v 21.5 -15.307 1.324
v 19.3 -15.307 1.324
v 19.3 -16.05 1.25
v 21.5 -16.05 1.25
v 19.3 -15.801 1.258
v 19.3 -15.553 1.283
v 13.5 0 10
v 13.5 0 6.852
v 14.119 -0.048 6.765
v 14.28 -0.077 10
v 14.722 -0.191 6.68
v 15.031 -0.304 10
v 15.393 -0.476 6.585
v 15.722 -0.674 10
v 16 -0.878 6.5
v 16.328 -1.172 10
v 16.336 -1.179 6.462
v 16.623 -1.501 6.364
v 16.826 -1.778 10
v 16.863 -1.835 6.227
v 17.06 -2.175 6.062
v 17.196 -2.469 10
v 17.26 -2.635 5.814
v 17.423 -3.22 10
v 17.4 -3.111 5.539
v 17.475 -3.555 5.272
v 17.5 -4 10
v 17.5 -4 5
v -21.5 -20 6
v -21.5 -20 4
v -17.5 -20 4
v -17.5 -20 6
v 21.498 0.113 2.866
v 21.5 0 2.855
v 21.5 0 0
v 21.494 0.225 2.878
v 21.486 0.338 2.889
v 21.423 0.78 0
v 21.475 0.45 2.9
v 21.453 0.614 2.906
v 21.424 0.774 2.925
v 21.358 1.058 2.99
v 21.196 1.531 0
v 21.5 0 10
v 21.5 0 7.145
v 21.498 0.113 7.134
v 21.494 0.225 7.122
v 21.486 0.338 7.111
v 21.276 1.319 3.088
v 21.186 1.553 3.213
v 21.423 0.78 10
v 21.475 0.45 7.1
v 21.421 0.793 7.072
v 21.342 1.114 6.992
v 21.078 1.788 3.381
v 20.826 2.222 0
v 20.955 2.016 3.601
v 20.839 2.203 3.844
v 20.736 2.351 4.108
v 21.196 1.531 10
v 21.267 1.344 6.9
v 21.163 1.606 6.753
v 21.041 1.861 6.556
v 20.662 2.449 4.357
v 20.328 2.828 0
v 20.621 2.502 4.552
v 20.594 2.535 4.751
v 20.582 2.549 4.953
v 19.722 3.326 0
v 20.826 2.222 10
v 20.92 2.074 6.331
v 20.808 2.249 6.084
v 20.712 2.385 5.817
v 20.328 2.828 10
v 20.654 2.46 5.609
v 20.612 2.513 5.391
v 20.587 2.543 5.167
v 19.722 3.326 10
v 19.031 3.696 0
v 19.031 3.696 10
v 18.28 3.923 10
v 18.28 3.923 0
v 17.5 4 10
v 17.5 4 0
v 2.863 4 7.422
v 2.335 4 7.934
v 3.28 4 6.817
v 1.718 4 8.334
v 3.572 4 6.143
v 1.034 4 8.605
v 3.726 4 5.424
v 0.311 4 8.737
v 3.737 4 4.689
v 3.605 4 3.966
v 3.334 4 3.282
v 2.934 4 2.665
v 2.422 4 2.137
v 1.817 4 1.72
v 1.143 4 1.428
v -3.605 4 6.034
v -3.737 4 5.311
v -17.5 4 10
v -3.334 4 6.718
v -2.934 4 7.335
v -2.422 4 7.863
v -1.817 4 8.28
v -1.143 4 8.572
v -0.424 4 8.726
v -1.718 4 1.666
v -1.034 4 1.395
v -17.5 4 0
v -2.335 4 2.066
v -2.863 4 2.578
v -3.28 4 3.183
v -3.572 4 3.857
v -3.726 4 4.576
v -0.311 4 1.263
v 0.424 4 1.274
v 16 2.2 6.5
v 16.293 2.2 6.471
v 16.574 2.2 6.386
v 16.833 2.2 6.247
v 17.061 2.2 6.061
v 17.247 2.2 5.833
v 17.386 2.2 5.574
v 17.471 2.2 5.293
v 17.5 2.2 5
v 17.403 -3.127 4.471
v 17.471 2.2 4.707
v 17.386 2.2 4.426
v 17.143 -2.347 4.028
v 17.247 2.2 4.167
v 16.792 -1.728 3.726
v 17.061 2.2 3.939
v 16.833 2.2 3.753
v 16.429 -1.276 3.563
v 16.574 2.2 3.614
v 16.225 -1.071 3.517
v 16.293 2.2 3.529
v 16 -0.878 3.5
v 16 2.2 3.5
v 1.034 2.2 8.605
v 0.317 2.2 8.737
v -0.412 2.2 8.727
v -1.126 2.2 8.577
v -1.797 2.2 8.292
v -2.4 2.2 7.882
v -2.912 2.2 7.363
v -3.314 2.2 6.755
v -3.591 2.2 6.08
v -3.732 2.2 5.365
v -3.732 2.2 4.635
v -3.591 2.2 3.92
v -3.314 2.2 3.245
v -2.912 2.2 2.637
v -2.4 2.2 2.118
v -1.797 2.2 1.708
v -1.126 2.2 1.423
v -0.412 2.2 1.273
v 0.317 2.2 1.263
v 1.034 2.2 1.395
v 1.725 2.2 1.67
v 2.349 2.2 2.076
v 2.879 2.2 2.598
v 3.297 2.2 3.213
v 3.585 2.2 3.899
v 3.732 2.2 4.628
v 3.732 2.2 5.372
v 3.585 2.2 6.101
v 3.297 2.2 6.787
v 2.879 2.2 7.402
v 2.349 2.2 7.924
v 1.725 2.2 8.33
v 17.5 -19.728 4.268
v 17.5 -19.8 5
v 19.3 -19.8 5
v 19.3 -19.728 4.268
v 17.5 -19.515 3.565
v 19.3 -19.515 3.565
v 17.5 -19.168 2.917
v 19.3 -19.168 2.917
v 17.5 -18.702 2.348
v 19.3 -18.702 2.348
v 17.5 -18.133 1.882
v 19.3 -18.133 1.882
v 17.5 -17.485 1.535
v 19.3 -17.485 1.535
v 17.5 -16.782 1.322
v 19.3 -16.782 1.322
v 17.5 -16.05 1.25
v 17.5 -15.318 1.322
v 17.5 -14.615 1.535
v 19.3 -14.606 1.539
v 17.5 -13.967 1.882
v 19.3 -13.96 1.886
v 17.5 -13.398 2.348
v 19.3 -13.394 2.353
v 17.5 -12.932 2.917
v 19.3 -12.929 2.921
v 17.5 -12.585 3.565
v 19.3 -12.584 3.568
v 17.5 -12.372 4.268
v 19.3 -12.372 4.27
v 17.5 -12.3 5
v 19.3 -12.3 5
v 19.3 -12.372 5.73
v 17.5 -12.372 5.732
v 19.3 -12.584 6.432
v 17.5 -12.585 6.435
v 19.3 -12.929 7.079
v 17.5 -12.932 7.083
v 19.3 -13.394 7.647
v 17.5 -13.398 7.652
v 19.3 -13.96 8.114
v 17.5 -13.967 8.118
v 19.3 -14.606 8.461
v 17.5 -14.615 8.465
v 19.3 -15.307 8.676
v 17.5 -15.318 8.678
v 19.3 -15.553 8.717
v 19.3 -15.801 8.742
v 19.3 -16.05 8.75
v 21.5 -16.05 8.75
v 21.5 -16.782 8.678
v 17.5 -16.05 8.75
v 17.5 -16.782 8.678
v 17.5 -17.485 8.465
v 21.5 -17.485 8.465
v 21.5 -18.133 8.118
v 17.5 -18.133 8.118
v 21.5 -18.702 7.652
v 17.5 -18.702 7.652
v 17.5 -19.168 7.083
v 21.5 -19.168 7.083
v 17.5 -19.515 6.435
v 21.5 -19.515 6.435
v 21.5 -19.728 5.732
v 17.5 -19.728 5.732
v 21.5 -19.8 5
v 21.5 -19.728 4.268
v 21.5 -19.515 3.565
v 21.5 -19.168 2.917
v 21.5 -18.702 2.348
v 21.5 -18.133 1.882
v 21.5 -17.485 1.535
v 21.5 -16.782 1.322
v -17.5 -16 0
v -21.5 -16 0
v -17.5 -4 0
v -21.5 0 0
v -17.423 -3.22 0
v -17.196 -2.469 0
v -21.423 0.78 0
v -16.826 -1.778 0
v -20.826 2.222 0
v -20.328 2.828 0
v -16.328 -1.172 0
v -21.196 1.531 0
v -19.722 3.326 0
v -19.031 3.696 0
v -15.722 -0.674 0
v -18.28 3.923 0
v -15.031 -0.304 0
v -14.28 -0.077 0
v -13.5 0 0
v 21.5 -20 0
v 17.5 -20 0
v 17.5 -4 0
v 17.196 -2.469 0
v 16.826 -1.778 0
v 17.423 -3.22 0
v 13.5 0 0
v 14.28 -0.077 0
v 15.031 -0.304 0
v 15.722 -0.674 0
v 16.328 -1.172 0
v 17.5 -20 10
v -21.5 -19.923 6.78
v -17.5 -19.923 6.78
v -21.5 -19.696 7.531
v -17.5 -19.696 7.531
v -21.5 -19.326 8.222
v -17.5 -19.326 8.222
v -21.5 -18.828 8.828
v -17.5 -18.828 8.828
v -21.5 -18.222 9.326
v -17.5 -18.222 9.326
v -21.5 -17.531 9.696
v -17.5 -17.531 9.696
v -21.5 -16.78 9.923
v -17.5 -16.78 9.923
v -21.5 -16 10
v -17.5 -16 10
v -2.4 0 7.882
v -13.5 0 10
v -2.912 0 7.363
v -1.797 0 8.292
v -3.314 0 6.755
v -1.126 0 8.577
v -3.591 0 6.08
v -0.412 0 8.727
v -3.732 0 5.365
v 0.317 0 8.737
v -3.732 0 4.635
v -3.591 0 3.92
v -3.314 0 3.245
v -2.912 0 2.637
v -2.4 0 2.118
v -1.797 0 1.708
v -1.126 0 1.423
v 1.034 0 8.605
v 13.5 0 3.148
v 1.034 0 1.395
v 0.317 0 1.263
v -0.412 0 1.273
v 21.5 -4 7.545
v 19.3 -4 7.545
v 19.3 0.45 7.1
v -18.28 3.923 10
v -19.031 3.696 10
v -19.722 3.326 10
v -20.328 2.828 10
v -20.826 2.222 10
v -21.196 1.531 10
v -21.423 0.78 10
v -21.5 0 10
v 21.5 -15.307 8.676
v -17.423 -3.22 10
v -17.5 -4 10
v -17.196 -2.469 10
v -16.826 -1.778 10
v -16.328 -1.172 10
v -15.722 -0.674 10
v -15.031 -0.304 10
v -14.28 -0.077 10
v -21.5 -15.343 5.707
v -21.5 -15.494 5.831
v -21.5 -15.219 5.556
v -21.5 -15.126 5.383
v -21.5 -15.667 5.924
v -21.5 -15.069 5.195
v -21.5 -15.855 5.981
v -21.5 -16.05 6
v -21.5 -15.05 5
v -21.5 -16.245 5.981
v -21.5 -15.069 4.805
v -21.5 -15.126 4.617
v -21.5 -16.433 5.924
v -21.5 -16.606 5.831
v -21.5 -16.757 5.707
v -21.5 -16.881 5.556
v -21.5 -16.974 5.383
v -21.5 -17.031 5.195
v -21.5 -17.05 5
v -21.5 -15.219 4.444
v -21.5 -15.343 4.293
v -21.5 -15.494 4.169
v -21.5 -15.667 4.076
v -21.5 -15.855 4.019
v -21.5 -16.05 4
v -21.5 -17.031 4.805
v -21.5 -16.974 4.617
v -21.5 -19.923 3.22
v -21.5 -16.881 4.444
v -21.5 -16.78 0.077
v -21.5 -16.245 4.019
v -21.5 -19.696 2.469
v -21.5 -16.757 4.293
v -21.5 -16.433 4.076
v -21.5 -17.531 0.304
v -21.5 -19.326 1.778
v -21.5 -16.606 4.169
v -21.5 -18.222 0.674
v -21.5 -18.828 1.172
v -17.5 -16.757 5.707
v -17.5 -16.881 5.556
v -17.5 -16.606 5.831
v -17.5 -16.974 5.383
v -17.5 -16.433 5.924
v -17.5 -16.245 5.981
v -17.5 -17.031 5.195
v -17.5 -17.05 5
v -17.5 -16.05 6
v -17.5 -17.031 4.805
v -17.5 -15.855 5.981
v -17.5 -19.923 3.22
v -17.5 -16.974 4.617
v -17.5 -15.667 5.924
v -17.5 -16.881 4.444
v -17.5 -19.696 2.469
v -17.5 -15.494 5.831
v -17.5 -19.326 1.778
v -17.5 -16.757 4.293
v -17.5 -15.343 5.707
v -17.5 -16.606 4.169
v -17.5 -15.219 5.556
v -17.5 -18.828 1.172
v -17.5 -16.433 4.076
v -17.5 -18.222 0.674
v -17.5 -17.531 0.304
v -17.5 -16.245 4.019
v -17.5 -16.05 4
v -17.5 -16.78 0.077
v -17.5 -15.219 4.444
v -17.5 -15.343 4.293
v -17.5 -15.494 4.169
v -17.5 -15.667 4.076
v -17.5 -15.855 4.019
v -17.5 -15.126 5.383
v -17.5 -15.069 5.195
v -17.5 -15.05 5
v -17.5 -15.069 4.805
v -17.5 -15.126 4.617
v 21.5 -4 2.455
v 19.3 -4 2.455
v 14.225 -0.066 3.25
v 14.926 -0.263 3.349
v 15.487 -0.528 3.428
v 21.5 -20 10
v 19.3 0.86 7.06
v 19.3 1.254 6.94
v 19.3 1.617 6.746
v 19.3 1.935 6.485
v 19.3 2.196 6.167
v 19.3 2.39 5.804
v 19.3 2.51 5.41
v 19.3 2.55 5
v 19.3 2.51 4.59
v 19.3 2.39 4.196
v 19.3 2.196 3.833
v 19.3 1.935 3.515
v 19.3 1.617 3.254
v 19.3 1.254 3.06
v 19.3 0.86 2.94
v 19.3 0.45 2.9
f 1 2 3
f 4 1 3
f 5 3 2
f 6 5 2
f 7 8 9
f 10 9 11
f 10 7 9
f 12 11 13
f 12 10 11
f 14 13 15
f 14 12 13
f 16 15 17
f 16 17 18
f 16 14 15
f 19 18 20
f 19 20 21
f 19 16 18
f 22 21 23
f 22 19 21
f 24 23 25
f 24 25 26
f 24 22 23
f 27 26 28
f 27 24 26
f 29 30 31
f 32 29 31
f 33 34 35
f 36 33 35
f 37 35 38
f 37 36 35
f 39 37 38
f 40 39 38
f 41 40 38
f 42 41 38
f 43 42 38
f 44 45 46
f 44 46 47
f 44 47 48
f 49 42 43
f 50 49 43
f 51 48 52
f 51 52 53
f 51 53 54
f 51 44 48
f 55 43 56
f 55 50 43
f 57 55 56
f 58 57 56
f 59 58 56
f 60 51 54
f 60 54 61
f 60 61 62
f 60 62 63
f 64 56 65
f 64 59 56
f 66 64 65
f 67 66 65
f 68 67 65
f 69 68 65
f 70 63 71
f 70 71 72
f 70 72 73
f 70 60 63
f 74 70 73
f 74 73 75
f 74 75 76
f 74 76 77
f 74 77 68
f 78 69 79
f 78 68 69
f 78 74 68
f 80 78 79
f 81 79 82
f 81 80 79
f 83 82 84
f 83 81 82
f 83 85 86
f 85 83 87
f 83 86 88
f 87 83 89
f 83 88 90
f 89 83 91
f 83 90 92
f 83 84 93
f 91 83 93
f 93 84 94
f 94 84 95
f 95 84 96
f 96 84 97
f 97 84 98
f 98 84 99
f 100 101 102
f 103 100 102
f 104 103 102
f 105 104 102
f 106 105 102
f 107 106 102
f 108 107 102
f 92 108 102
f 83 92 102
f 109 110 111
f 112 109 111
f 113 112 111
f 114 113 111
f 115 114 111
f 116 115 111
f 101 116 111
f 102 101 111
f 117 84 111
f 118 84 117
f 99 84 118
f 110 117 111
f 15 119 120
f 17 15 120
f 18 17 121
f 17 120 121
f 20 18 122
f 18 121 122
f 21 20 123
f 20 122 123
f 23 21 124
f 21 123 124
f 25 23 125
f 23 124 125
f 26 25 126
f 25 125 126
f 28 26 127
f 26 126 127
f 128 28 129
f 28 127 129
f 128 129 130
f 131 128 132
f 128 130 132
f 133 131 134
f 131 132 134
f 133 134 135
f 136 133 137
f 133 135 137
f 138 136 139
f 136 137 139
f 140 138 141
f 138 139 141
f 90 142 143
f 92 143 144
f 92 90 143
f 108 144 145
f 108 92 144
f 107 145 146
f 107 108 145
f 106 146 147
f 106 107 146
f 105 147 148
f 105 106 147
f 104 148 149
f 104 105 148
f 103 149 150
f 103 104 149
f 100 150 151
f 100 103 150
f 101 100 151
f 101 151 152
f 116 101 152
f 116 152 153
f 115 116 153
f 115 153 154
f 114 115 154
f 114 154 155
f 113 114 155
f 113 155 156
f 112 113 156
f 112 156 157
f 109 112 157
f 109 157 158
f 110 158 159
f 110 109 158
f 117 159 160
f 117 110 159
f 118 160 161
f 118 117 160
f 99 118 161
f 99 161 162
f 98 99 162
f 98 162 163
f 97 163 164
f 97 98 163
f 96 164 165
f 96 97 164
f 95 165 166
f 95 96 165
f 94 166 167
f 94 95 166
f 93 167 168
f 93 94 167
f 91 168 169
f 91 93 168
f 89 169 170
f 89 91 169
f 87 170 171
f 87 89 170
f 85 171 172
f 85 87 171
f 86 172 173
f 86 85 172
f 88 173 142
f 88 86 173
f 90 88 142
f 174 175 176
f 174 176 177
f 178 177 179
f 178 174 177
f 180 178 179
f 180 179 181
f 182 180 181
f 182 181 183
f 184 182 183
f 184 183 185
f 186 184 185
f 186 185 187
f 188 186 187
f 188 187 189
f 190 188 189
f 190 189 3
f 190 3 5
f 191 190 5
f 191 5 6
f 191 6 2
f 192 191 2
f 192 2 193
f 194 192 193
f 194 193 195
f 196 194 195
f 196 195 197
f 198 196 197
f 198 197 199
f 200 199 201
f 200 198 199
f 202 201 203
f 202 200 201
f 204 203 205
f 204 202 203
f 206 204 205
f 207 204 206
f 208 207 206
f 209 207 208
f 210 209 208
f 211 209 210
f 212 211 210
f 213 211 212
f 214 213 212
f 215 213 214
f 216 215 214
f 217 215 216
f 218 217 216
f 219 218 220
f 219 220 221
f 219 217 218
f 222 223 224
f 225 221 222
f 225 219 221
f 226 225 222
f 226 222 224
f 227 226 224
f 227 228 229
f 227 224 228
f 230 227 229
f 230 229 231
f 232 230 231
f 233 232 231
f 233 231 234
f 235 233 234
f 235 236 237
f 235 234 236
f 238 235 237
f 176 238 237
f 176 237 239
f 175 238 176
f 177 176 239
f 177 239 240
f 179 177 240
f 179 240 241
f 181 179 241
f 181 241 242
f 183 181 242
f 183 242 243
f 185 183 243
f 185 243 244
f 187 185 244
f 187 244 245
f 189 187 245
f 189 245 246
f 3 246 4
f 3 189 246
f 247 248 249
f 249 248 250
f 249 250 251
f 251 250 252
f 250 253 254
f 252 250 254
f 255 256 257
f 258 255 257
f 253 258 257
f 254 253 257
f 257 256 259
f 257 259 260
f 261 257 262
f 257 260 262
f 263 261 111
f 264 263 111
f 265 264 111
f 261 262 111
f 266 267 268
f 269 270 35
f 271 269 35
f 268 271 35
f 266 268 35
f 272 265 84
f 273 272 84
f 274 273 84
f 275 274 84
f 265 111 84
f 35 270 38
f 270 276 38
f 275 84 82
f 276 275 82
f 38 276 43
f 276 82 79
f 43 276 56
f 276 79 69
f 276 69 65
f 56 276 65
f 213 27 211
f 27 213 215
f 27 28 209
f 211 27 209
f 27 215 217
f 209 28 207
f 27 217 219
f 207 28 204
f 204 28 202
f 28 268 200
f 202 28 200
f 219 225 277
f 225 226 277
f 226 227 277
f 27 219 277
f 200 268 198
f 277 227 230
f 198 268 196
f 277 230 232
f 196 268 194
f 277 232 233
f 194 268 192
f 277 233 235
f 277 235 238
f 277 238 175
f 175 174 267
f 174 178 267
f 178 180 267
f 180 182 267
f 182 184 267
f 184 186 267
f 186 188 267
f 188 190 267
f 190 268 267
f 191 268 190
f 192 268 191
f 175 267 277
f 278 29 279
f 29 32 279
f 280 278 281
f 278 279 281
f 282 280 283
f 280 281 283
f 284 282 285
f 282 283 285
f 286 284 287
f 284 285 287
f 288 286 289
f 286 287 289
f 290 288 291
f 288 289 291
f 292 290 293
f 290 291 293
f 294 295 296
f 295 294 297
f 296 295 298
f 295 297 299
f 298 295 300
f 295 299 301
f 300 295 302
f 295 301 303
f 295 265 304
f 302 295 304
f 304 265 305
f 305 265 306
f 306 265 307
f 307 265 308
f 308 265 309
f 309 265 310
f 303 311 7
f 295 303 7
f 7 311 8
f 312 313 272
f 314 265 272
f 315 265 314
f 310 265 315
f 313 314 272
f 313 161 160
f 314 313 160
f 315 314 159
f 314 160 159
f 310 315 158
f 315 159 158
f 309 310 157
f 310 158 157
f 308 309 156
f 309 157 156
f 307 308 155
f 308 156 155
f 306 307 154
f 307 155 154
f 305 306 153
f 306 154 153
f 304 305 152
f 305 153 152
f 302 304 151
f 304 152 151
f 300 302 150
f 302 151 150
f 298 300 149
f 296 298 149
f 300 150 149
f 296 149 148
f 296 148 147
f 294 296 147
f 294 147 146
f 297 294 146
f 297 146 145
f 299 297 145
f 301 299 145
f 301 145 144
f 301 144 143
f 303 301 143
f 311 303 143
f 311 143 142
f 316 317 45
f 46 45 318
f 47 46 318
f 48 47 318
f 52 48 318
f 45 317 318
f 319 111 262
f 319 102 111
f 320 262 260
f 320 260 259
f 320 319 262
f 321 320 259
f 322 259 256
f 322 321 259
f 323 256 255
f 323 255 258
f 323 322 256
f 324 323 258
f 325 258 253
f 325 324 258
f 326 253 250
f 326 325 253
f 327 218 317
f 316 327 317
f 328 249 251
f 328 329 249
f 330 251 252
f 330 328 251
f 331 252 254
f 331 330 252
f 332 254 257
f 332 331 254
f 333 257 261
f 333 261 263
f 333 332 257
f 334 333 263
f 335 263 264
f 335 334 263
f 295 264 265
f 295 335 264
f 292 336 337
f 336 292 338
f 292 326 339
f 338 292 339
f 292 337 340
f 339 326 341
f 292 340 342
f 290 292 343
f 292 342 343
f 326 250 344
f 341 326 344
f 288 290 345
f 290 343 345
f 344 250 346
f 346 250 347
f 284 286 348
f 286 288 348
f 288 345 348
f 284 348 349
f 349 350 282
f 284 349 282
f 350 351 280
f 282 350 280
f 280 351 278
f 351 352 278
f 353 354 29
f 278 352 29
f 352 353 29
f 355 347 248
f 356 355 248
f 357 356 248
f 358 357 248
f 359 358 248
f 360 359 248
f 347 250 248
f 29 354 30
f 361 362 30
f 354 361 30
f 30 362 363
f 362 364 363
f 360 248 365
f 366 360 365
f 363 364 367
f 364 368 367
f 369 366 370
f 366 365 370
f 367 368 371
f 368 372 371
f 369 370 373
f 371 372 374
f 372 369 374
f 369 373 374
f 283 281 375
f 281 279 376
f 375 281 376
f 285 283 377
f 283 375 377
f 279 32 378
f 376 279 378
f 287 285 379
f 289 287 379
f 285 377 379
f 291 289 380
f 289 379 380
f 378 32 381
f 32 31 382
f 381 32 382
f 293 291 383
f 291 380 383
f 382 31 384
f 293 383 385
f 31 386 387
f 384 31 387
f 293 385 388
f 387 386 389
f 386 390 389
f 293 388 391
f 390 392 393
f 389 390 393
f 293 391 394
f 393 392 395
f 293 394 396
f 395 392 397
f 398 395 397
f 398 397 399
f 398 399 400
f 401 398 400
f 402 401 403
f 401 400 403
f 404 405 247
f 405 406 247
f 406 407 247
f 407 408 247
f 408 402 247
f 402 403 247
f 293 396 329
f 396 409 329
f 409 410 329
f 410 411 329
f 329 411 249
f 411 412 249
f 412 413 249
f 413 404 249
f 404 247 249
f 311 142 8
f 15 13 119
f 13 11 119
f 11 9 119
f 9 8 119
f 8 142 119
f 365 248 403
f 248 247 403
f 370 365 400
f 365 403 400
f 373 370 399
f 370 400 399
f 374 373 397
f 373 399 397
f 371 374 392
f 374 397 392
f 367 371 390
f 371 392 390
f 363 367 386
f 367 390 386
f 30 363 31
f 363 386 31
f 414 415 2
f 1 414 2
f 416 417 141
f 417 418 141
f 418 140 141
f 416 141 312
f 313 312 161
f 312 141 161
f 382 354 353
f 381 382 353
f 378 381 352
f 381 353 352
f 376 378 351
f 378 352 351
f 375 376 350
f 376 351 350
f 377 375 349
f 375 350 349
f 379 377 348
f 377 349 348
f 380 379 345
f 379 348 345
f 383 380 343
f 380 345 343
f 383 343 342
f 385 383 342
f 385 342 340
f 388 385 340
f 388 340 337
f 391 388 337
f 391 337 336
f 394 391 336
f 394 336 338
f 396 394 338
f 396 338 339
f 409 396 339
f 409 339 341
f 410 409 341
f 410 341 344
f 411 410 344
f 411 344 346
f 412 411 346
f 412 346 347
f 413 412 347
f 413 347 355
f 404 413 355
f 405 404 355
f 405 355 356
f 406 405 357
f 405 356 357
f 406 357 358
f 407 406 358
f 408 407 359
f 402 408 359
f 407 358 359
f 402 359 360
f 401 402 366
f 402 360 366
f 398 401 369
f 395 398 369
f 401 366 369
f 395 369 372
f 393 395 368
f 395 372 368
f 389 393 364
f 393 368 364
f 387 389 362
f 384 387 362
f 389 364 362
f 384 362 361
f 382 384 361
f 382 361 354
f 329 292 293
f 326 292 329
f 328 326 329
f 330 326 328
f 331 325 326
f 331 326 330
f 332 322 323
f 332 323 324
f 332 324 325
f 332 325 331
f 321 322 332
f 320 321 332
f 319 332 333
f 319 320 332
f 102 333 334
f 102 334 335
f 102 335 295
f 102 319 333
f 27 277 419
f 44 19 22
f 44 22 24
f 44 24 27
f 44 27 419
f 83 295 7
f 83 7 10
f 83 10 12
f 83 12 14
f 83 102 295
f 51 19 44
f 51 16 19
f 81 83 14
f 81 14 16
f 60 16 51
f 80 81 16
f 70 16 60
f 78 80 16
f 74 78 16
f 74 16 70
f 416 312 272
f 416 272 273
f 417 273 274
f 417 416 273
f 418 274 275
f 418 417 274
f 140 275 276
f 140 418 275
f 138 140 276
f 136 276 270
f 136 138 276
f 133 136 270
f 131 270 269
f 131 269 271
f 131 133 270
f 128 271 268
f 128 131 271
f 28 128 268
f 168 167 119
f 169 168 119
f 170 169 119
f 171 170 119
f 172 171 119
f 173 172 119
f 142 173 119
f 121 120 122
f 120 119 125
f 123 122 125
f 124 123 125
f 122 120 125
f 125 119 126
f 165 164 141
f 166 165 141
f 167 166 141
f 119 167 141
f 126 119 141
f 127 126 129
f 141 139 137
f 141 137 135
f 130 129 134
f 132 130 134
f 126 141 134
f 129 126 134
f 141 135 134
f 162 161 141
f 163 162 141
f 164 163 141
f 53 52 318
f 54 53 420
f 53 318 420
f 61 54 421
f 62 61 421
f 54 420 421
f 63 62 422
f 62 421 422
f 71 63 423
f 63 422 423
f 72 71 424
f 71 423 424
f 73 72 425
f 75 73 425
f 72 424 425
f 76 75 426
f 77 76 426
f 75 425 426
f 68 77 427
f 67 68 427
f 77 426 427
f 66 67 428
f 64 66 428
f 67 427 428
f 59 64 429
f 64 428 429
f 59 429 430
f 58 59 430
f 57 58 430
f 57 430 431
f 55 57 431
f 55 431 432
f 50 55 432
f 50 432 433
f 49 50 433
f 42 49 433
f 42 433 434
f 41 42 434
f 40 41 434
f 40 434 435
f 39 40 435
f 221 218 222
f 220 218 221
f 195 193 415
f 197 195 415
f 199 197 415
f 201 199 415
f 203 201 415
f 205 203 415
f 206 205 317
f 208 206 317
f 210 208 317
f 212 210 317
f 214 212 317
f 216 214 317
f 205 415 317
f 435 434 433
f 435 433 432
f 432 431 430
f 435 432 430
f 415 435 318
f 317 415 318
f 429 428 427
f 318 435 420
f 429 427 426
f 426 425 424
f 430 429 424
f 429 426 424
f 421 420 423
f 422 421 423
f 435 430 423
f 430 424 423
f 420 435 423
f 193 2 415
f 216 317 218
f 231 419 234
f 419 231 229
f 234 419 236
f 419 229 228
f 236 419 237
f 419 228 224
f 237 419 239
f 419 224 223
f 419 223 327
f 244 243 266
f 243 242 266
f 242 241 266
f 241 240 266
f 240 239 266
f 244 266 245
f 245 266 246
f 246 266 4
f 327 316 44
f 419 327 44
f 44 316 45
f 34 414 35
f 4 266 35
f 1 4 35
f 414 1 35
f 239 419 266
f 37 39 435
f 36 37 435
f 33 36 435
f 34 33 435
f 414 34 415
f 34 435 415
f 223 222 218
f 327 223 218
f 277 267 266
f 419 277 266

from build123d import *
from build123d.topology import SkipClean

# Parameters (mm, degrees)
EXTRUDE_THIN1_DEPTH = 10
FILLET1_R           = 4
CUT_EXTRUDE1_START  = -1.8
CUT_EXTRUDE1_DEPTH  = 44.155533586
CUT_EXTRUDE7_START  = -10
SKETCH10_R          = 3.75
CUT_EXTRUDE7_DEPTH  = 10
SKETCH4_R           = 1
CUT_EXTRUDE2_DEPTH  = 6
FILLET2_R           = 4
CUT_EXTRUDE5_START  = -1.8
CUT_EXTRUDE5_DEPTH  = 32.937960909
CUT_EXTRUDE9_START  = -10
SKETCH12_R          = 3.75
CUT_EXTRUDE9_DEPTH  = 10


with BuildPart() as part:
    # Sketch1 → Extrude-Thin1 (new body)
    with BuildSketch(Plane.XY):
        Polygon((-17.5, -20), (-17.5, 0), (17.5, 0), (17.5, -20), (21.5, -20), (21.5, 4), (-21.5, 4), (-21.5, -20), align=None)
    extrude(amount=EXTRUDE_THIN1_DEPTH)

    # Fillet1
    fillet1_edges = [part.edges().sort_by_distance(p)[0] for p in [
        (-21.5, 4, 5),
        (21.5, 4, 5),
        (17.5, 0, 5),
        (-17.5, 0, 5),
    ]]
    fillet(fillet1_edges, radius=FILLET1_R)

    # Sketch3 → Cut-Extrude1 (cut, through all)
    with BuildSketch(Plane.ZY.offset(-17.5).offset(CUT_EXTRUDE1_START)):
        with BuildLine():
            Line((1.324257426, -15.307425743), (1.25, -16.05))
            ThreePointArc((1.25, -16.05), (5, -19.8), (8.75, -16.05))
            Line((8.75, -16.05), (8.675742574, -15.307425743))
            Line((8.675742574, -15.307425743), (7.545, -4))
            Line((7.545, -4), (2.455, -4))
            Line((2.455, -4), (1.324257426, -15.307425743))
        make_face()
        with BuildLine():
            Line((2.9, 0.45), (2.455, -4))
            Line((2.455, -4), (7.545, -4))
            Line((7.545, -4), (7.1, 0.45))
            ThreePointArc((7.1, 0.45), (5, 2.55), (2.9, 0.45))
        make_face()
    extrude(amount=-CUT_EXTRUDE1_DEPTH, mode=Mode.SUBTRACT)

    # Sketch10 → Cut-Extrude7 (cut)
    with BuildSketch(Plane(origin=(19.3, 0, 0), x_dir=(0, 0, -1), z_dir=(1, 0, 0)).offset(CUT_EXTRUDE7_START)):
        with Locations(Location((-5, -16.05, 0), (0, 0, 270))):
            Circle(SKETCH10_R)
    extrude(amount=CUT_EXTRUDE7_DEPTH, mode=Mode.SUBTRACT)

    # Sketch4 → Cut-Extrude2 (cut)
    with BuildSketch(Plane.ZY.offset(21.5)):
        with Locations(Location((5, -16.05, 0), (0, 0, 270))):
            Circle(SKETCH4_R)
    extrude(amount=-CUT_EXTRUDE2_DEPTH, mode=Mode.SUBTRACT)

    # Fillet2
    fillet2_edges = [part.edges().sort_by_distance(p)[0] for p in [
        (-19.5, -20, 10),
        (-19.5, -20, 0),
    ]]
    fillet(fillet2_edges, radius=FILLET2_R)

    # Sketch8 → Cut-Extrude5 (cut, through all)
    with BuildSketch(Plane(origin=(0, 4, 0), x_dir=(1, 0, 0), z_dir=(0, 1, 0)).offset(CUT_EXTRUDE5_START)):
        with BuildLine():
            Line((1.034235097, -8.604560689), (16, -6.5))
            ThreePointArc((16, -6.5), (17.5, -5), (16, -3.5))
            Line((16, -3.5), (1.034235097, -1.395439311))
            ThreePointArc((1.034235097, -1.395439311), (-3.75, -5), (1.034235097, -8.604560689))
        make_face()
    extrude(amount=-CUT_EXTRUDE5_DEPTH, mode=Mode.SUBTRACT)

    # Sketch12 → Cut-Extrude9 (cut)
    with SkipClean():  # the faces are left unmerged after this step: merging them gives an invalid solid
        with BuildSketch(Plane.XZ.offset(-2.2).offset(CUT_EXTRUDE9_START)):
            with Locations(Location((0, 5, 0), (0, 0, 73.990542285))):
                Circle(SKETCH12_R)
        extrude(amount=CUT_EXTRUDE9_DEPTH, mode=Mode.SUBTRACT)


solid = part.part
